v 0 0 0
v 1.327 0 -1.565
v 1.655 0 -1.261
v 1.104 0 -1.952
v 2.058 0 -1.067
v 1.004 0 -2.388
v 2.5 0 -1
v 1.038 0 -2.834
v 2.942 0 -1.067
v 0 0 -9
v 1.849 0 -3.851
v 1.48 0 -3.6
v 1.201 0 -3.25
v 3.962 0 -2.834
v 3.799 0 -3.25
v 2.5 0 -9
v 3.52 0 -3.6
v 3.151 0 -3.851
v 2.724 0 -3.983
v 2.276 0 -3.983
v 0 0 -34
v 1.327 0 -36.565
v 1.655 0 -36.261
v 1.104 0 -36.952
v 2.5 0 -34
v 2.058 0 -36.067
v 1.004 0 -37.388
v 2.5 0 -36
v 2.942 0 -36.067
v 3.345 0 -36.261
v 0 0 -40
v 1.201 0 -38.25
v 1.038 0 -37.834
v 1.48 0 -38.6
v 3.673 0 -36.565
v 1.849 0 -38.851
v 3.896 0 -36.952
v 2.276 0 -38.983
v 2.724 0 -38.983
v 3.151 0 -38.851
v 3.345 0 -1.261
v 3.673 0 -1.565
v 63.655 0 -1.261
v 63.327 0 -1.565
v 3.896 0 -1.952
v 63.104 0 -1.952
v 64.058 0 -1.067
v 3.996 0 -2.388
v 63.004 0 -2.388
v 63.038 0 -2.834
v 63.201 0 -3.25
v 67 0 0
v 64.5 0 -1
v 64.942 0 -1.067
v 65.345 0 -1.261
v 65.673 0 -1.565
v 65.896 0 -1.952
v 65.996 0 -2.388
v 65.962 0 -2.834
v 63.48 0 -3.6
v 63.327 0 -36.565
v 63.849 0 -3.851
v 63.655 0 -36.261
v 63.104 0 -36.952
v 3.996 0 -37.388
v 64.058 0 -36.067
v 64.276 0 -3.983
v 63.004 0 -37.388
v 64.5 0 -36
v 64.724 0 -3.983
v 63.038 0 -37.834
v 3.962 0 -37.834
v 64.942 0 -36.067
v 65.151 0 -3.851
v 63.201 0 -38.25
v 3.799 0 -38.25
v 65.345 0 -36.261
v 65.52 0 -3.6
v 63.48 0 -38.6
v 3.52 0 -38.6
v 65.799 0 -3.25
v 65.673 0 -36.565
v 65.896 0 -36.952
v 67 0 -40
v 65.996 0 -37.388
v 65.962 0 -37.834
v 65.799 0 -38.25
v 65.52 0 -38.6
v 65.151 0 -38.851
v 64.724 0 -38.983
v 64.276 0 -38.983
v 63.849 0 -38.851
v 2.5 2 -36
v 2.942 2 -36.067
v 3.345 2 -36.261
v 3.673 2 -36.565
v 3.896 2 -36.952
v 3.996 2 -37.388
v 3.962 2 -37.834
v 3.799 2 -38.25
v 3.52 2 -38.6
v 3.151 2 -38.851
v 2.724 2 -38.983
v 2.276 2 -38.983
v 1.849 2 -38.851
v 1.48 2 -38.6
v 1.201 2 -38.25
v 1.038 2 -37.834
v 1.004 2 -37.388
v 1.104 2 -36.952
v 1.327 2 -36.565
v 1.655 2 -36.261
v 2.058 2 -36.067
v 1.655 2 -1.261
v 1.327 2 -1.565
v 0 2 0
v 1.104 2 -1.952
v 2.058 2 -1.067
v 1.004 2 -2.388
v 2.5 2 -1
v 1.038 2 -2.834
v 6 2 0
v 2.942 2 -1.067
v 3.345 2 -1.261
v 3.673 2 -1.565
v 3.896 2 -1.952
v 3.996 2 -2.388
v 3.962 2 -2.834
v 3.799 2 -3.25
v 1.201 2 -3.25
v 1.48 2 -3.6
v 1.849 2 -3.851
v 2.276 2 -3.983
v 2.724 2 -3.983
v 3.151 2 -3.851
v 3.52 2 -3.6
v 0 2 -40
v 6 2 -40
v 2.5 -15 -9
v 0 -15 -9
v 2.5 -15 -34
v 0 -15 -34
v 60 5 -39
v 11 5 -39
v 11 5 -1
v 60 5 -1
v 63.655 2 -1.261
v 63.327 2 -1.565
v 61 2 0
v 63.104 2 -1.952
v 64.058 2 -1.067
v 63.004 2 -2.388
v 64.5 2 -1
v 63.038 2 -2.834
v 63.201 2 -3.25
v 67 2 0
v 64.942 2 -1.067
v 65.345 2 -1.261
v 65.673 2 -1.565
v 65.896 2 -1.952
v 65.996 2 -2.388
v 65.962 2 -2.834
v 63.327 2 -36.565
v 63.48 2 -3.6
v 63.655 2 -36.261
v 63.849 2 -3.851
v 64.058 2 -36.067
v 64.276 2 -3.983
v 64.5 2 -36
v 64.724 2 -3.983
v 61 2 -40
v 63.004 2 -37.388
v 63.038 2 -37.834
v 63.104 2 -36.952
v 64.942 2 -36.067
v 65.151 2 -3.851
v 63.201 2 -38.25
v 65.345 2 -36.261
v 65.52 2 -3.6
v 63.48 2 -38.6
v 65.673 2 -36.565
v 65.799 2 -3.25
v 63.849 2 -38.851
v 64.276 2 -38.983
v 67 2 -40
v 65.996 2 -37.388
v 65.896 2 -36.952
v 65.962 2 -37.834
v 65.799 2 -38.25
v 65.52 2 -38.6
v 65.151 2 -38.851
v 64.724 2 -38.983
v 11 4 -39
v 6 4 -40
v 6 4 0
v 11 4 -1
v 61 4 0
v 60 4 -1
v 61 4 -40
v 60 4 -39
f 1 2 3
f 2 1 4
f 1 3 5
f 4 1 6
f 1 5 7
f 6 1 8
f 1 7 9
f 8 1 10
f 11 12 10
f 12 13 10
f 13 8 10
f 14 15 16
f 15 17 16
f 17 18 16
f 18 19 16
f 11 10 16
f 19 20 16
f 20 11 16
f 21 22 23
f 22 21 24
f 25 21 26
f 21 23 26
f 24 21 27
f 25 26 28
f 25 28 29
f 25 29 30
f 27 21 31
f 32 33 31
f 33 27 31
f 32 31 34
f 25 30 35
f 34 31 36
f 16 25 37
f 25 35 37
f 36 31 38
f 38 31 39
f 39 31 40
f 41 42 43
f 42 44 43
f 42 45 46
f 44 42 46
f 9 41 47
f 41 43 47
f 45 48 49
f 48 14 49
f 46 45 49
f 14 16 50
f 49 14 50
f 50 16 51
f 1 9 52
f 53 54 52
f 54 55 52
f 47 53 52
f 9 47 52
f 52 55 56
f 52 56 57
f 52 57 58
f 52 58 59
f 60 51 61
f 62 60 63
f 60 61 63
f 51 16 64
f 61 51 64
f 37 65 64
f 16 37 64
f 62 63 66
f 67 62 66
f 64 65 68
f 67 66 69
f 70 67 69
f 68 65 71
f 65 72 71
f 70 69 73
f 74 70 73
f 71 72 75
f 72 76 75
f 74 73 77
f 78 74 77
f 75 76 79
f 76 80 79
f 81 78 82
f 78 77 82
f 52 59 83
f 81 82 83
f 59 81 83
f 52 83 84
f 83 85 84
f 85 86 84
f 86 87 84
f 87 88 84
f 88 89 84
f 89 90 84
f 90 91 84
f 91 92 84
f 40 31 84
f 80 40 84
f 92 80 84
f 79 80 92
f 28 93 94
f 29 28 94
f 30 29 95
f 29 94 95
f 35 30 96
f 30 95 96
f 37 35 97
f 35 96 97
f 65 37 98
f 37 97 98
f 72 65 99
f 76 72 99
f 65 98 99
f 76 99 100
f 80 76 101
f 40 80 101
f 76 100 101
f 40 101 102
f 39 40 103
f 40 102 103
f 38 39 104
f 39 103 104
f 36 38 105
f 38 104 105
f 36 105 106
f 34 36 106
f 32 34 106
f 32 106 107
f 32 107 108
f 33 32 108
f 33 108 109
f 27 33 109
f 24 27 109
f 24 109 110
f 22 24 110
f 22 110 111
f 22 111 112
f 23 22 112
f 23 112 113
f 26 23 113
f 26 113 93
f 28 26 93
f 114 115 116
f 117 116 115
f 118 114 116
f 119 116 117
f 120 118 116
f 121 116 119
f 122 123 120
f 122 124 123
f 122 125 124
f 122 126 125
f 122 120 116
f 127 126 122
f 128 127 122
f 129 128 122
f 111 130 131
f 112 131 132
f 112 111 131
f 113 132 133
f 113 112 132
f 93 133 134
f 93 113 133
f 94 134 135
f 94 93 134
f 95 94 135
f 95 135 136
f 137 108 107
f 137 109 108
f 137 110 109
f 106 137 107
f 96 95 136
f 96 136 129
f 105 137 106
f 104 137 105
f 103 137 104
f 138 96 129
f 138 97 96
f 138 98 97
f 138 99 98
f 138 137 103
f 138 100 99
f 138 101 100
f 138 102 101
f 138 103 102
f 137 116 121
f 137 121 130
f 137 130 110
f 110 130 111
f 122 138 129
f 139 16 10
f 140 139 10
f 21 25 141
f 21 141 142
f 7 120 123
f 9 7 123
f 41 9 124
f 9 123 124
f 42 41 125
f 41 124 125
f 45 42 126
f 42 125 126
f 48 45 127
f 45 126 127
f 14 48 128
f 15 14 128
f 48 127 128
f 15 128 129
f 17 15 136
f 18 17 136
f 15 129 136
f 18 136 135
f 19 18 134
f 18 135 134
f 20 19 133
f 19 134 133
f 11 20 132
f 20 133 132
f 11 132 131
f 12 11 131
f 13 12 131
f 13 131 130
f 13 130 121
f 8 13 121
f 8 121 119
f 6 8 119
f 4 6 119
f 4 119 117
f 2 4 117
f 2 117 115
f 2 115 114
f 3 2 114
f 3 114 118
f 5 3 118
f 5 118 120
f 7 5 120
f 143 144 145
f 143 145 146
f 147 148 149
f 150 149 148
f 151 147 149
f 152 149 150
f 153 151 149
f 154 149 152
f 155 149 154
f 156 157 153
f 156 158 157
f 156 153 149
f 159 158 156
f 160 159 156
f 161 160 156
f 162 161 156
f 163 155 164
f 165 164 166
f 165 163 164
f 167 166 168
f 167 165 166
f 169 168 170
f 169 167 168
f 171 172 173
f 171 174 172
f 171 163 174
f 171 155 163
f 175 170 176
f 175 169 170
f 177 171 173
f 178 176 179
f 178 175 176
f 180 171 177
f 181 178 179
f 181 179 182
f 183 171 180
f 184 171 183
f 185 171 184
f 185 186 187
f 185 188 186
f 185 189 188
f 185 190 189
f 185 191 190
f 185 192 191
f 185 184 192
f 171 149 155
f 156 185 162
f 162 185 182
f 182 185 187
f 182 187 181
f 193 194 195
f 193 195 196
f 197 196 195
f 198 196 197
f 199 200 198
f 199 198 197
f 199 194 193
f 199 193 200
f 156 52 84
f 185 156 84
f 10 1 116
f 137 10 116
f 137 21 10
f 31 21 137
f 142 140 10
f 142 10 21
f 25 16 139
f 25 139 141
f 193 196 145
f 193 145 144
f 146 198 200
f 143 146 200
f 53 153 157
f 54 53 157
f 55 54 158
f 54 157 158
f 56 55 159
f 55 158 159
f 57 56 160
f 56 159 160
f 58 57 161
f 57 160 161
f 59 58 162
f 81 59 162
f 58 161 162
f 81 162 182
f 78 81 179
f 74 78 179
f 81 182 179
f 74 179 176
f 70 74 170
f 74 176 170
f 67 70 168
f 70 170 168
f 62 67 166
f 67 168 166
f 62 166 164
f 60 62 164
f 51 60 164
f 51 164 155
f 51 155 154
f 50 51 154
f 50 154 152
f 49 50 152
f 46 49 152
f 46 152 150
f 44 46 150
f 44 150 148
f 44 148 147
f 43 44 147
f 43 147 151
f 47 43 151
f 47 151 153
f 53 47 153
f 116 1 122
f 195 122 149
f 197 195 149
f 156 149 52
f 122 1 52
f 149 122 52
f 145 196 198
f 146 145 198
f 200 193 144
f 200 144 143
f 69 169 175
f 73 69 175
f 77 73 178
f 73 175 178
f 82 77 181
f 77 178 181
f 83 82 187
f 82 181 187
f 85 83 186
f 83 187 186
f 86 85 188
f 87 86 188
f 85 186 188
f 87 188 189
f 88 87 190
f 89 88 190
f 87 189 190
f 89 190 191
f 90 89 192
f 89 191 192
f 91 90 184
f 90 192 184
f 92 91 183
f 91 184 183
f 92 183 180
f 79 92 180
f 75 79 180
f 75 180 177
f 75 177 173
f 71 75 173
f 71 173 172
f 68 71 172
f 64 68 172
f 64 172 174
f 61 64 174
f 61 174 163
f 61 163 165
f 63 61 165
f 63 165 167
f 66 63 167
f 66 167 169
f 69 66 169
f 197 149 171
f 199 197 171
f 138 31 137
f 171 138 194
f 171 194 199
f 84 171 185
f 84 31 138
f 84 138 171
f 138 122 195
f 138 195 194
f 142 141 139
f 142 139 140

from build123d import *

# Parameters (mm, degrees)
SKETCH1_W           = 67
SKETCH1_H           = 40
BOSS_EXTRUDE1_DEPTH = 2
SKETCH2_W           = 55
SKETCH2_H           = 40
BOSS_EXTRUDE2_DEPTH = 2
SKETCH3_W           = 49
SKETCH3_H           = 38
BOSS_EXTRUDE4_DEPTH = 1
CUT_EXTRUDE1_REACH  = 80.09
SKETCH4_R           = 1.5
CUT_EXTRUDE2_REACH  = 80.09
SKETCH5_R           = 1.5
CUT_EXTRUDE3_REACH  = 80.09
SKETCH6_R           = 1.5
CUT_EXTRUDE4_REACH  = 80.09
SKETCH7_R           = 1.5
SKETCH9_W           = 2.5
SKETCH9_H           = 25
BOSS_EXTRUDE7_DEPTH = 15


with BuildPart() as part:
    # Sketch1 → Boss-Extrude1 (new body)
    with BuildSketch(Plane(origin=(0, 0, 0), x_dir=(1, 0, 0), z_dir=(0, 1, 0))):
        with Locations((33.5, 20)):
            Rectangle(SKETCH1_W, SKETCH1_H)
    extrude(amount=BOSS_EXTRUDE1_DEPTH)

    # Sketch2 → Boss-Extrude2 (add)
    with BuildSketch(Plane(origin=(0, 2, 0), x_dir=(1, 0, 0), z_dir=(0, 1, 0))):
        with Locations((33.5, 20)):
            Rectangle(SKETCH2_W, SKETCH2_H)
    extrude(amount=BOSS_EXTRUDE2_DEPTH)

    # Sketch3 → Boss-Extrude4 (add)
    with BuildSketch(Plane(origin=(0, 4, 0), x_dir=(1, 0, 0), z_dir=(0, 1, 0))):
        with Locations((35.5, 20)):
            Rectangle(SKETCH3_W, SKETCH3_H)
    extrude(amount=BOSS_EXTRUDE4_DEPTH)

    # Sketch4 → Cut-Extrude1 (cut, up to next)
    with BuildSketch(Plane(origin=(0, 2, 0), x_dir=(1, 0, 0), z_dir=(0, 1, 0)), mode=Mode.PRIVATE) as cut_extrude1_sk1:
        with Locations(Location((2.5, 37.5, 0), (0, 0, 270))):
            Circle(SKETCH4_R)
    cut_extrude1_tool1 = extrude(cut_extrude1_sk1.sketch, amount=-CUT_EXTRUDE1_REACH, mode=Mode.PRIVATE) & part.part
    add(cut_extrude1_tool1.solids().sort_by_distance((2.5, 2, -37.5))[0], mode=Mode.SUBTRACT)

    # Sketch5 → Cut-Extrude2 (cut, up to next)
    with BuildSketch(Plane(origin=(0, 2, 0), x_dir=(1, 0, 0), z_dir=(0, 1, 0)), mode=Mode.PRIVATE) as cut_extrude2_sk1:
        with Locations(Location((2.5, 2.5, 0), (0, 0, 270))):
            Circle(SKETCH5_R)
    cut_extrude2_tool1 = extrude(cut_extrude2_sk1.sketch, amount=-CUT_EXTRUDE2_REACH, mode=Mode.PRIVATE) & part.part
    add(cut_extrude2_tool1.solids().sort_by_distance((2.5, 2, -2.5))[0], mode=Mode.SUBTRACT)

    # Sketch6 → Cut-Extrude3 (cut, up to next)
    with BuildSketch(Plane(origin=(0, 2, 0), x_dir=(1, 0, 0), z_dir=(0, 1, 0)), mode=Mode.PRIVATE) as cut_extrude3_sk1:
        with Locations(Location((64.5, 37.5, 0), (0, 0, 270))):
            Circle(SKETCH6_R)
    cut_extrude3_tool1 = extrude(cut_extrude3_sk1.sketch, amount=-CUT_EXTRUDE3_REACH, mode=Mode.PRIVATE) & part.part
    add(cut_extrude3_tool1.solids().sort_by_distance((64.5, 2, -37.5))[0], mode=Mode.SUBTRACT)

    # Sketch7 → Cut-Extrude4 (cut, up to next)
    with BuildSketch(Plane(origin=(0, 2, 0), x_dir=(1, 0, 0), z_dir=(0, 1, 0)), mode=Mode.PRIVATE) as cut_extrude4_sk1:
        with Locations(Location((64.5, 2.5, 0), (0, 0, 270))):
            Circle(SKETCH7_R)
    cut_extrude4_tool1 = extrude(cut_extrude4_sk1.sketch, amount=-CUT_EXTRUDE4_REACH, mode=Mode.PRIVATE) & part.part
    add(cut_extrude4_tool1.solids().sort_by_distance((64.5, 2, -2.5))[0], mode=Mode.SUBTRACT)

    # Sketch9 → Boss-Extrude7 (add)
    with BuildSketch(Plane(origin=(0, 0, 0), x_dir=(-1, 0, 0), z_dir=(0, -1, 0))):
        with Locations((-1.25, 21.5)):
            Rectangle(SKETCH9_W, SKETCH9_H)
    extrude(amount=BOSS_EXTRUDE7_DEPTH)


solid = part.part
